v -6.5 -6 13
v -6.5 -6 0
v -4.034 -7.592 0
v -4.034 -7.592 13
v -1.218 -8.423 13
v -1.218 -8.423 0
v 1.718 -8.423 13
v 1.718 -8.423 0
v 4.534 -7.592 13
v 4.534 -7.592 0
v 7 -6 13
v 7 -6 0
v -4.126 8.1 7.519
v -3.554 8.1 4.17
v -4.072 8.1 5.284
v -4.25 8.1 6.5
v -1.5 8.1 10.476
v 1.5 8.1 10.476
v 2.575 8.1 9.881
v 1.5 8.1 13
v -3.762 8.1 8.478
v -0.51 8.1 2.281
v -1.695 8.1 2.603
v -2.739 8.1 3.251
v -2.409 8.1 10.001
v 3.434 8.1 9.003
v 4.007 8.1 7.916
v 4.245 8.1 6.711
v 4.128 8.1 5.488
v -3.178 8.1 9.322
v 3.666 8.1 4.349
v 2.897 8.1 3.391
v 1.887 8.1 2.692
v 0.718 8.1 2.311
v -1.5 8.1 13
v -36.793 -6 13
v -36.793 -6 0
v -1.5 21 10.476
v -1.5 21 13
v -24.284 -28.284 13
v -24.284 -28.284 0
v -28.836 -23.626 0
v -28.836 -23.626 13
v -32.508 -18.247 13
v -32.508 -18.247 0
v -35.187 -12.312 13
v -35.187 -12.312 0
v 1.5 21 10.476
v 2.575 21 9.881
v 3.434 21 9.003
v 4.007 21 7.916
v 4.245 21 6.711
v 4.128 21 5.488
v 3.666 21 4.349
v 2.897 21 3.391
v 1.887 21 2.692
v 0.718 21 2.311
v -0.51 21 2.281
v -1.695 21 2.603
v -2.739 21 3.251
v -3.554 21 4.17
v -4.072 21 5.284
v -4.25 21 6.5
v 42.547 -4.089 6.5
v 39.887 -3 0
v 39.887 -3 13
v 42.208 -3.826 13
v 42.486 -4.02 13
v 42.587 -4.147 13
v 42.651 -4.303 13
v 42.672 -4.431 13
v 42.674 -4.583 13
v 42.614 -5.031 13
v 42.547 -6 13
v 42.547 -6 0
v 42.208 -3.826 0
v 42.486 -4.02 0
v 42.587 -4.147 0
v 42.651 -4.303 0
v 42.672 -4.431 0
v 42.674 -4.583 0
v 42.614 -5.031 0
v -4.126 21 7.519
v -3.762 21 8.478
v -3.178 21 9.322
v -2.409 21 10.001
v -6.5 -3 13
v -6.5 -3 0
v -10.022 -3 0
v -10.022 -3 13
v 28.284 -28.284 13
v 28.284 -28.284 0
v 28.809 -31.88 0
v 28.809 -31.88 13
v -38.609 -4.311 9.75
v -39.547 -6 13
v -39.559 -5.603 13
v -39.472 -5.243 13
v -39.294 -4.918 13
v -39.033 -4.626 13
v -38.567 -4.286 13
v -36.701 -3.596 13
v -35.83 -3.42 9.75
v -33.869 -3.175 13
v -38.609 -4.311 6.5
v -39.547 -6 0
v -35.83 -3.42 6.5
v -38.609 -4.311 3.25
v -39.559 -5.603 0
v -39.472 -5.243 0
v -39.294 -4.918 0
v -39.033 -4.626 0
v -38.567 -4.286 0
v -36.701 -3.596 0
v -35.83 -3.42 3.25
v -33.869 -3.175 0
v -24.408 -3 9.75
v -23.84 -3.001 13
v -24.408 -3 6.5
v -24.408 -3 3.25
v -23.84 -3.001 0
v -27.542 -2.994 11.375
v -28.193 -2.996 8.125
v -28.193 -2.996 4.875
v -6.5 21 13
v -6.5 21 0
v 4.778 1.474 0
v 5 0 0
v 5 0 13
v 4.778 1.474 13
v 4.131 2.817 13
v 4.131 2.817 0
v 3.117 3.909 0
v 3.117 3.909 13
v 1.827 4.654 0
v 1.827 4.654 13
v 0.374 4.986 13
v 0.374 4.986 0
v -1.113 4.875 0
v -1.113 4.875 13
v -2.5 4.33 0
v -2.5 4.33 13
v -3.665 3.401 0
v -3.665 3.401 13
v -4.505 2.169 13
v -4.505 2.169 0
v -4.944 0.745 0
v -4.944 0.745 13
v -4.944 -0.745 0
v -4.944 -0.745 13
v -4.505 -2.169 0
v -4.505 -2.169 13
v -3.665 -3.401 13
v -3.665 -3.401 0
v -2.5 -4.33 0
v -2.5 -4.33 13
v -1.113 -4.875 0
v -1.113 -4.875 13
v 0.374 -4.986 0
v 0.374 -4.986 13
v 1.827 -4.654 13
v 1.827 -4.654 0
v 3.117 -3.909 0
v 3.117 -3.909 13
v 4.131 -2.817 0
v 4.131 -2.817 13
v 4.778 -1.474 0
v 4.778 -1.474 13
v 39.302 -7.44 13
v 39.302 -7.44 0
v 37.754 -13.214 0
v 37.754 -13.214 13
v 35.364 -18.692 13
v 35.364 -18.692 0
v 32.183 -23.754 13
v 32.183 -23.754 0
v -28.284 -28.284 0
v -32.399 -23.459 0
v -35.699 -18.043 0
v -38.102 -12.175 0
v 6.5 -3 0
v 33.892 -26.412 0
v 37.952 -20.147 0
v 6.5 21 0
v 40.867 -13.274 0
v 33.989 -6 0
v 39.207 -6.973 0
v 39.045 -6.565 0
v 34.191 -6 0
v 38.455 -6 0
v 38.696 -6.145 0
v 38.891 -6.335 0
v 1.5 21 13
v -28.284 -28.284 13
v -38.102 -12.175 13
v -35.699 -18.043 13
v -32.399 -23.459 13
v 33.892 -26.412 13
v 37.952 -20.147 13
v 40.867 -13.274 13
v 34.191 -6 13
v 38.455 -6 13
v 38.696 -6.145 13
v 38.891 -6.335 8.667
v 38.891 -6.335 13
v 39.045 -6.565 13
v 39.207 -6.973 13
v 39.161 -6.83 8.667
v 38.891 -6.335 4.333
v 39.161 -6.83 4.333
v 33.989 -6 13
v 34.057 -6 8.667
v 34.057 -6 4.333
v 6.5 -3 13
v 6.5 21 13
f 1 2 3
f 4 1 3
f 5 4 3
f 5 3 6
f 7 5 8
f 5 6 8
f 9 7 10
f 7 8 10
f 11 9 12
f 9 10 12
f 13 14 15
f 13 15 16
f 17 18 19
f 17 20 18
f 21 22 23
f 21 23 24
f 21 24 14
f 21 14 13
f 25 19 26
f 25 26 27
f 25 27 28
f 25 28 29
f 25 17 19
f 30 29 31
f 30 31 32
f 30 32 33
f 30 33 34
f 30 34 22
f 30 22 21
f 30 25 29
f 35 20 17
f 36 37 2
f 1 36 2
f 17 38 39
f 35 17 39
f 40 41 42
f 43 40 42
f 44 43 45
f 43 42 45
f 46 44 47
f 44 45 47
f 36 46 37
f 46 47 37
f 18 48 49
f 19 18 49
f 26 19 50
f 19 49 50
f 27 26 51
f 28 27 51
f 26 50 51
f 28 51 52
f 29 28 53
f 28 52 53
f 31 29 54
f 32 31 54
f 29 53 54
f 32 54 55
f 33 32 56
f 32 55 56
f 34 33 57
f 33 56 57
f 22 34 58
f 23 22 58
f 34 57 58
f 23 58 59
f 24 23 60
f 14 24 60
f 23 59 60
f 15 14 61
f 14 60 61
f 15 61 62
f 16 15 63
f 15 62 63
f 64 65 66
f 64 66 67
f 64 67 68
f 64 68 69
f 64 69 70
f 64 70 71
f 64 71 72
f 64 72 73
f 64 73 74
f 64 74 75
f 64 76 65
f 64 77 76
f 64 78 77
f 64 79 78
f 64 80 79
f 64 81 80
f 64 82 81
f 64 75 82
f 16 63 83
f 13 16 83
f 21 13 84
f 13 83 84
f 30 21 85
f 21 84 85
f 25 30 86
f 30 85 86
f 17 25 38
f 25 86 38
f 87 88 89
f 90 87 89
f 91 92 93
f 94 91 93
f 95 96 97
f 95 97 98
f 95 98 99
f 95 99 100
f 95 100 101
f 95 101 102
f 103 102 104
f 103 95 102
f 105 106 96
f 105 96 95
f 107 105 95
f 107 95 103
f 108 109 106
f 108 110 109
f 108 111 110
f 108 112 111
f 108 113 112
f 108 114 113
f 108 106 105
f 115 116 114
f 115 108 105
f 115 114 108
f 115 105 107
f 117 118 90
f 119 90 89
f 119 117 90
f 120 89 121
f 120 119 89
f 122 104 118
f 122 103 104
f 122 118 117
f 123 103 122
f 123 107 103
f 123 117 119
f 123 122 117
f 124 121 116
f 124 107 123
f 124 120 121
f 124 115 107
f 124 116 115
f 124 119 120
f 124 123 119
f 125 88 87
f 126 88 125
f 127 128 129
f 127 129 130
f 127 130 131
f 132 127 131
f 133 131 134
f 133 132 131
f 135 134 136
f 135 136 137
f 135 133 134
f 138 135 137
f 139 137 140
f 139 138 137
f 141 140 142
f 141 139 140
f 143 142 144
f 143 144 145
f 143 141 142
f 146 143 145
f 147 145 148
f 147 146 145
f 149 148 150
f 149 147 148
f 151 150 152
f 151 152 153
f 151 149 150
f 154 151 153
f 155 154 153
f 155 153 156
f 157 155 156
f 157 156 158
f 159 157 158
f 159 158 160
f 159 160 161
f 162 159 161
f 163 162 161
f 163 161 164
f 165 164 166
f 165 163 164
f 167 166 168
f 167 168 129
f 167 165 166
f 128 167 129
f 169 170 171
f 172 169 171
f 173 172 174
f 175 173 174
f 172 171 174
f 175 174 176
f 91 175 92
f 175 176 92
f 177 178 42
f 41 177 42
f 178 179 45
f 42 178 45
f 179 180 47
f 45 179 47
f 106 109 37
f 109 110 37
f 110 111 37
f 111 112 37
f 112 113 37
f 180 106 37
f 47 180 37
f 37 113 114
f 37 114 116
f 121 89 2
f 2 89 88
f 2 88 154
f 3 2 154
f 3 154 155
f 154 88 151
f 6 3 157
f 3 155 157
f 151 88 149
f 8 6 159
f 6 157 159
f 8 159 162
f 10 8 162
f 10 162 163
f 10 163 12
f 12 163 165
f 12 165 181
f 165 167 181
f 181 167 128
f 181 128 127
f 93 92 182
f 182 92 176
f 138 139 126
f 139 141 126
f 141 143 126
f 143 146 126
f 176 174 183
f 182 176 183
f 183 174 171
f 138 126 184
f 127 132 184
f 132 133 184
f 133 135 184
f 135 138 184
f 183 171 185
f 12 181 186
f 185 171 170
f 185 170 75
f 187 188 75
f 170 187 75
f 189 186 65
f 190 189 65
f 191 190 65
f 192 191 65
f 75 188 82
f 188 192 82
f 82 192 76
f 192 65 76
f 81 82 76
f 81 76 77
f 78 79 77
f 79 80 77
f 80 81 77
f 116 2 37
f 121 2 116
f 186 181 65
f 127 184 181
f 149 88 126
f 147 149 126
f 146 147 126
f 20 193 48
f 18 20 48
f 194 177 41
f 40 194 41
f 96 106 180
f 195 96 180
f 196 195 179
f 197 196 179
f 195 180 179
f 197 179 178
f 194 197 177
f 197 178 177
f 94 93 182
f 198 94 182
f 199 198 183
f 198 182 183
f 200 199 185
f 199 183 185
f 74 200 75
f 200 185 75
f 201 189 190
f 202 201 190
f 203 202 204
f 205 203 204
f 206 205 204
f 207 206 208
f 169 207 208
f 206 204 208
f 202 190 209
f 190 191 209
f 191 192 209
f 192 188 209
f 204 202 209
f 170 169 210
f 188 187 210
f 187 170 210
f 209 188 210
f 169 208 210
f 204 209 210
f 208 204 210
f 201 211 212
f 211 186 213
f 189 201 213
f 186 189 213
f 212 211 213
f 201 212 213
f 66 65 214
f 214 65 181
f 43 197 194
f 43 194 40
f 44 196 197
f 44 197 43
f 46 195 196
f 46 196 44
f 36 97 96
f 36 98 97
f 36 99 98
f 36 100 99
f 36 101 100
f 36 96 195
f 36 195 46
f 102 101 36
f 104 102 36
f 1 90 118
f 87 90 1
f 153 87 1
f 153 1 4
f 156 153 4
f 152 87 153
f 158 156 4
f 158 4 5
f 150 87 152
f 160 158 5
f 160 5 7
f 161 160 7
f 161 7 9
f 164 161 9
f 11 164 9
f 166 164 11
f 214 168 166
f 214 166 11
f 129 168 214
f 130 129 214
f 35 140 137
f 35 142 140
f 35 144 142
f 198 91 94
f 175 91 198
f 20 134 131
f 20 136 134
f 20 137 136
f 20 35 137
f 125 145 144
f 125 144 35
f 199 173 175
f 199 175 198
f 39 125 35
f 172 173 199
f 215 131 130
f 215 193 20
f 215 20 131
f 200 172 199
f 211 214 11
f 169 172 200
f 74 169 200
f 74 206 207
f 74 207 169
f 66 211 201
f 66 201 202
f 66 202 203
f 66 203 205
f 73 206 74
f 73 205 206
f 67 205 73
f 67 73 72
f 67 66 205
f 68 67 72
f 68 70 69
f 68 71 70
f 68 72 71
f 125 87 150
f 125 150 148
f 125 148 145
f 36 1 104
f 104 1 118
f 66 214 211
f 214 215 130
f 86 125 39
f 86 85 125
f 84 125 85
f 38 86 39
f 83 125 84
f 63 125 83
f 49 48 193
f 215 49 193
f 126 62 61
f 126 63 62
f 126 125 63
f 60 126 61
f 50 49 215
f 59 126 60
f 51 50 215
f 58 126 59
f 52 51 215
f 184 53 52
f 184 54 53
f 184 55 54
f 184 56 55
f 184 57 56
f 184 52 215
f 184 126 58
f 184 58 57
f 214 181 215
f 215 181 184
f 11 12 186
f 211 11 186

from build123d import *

# Parameters (mm, degrees)
F0_W     = 13
F0_H     = 24
F2_DEPTH = 13
F1_R     = 5
F3_DEPTH = 13
F5_DEPTH = 12.9


with BuildPart() as f2:
    # F0 (on Top) → F2 (new body)
    with BuildSketch(Plane.XY):
        with BuildLine():
            Line((-6.5, -3), (-10.0215210102, -3))
            add(Edge.make_bspline(
                [(-39.5474398666, -6), (-39.987434644, -3.0998888332), (-28.0679892003, -2.9708801078), (-24.4776253005, -3.0066990198), (-20.0953720274, -2.997292433), (-10.1037282836, -3), (-10.0215210102, -3)],
                knots=[0, 0, 0, 0, 0.3086092965, 0.5067485278, 0.7164039889, 1, 1, 1, 1], degree=3))
            Line((-39.5474398666, -6), (-36.7930133316, -6))
            Line((-36.7930133316, -6), (-6.5, -6))
            Line((-6.5, -6), (-6.5, -3))
        make_face()
        with Locations((0, 9)):
            Rectangle(F0_W, F0_H)
        Polygon((6.5, -3), (-6.5, -3), (-6.5, -6), (7, -6), (7, -3), align=None)
        with BuildLine():
            Line((-36.7930133316, -6), (-39.5474398666, -6))
            ThreePointArc((-39.5474398666, -6), (-35.6991938904, -18.0434906705), (-28.2842712475, -28.2842712475))
            Line((-28.2842712475, -28.2842712475), (-24.2842712475, -28.2842712475))
            ThreePointArc((-24.2842712475, -28.2842712475), (-32.5077815168, -18.2474647794), (-36.7930133316, -6))
        make_face()
        with BuildLine():
            Line((7, -6), (-6.5, -6))
            ThreePointArc((-6.5, -6), (0.25, -8.5279488827), (7, -6))
        make_face()
        with BuildLine():
            Line((39.8873413504, -3), (7, -3))
            Line((7, -3), (7, -6))
            Line((7, -6), (33.9890345931, -6))
            Line((33.9890345931, -6), (34.1910820365, -6))
            add(Edge.make_bspline(
                [(34.1910820365, -6), (36.0233504005, -5.9865327697), (37.61673459, -5.6184481892), (38.4549424052, -6)],
                knots=[0.0219001831, 0.0219001831, 0.0219001831, 0.0219001831, 0.6204731295, 0.6204731295, 0.6204731295, 0.6204731295], degree=3))
            Line((38.4549424052, -6), (39.5474398666, -6))
            ThreePointArc((39.5474398666, -6), (39.4312622039, -6.7212767397), (39.3019308294, -7.4403113564))
            ThreePointArc((39.3019308294, -7.4403113564), (35.3637009344, -18.6924759254), (28.2842712475, -28.2842712475))
            Line((28.2842712475, -28.2842712475), (28.8087523399, -31.880094539))
            ThreePointArc((28.8087523399, -31.880094539), (37.9522247686, -20.1472895028), (42.5474398666, -6))
            add(Edge.make_bspline(
                [(39.8873413504, -3), (40.6612767941, -3.3893066613), (43.3643490326, -3.7338272559), (42.4692446307, -5.1334802328), (42.5474398666, -6)],
                knots=[0, 0, 0, 0, 0.5508525768, 1, 1, 1, 1], degree=3))
        make_face()
        with BuildLine():
            Line((34.1910820365, -6), (33.9890345931, -6))
            add(Edge.make_bspline(
                [(33.9890345931, -6), (34.0566866614, -6.0005107576), (34.124044238, -6.0004927299), (34.1910820365, -6)],
                knots=[0, 0, 0, 0, 0.0219001831, 0.0219001831, 0.0219001831, 0.0219001831], degree=3))
        make_face()
        with BuildLine():
            add(Edge.make_bspline(
                [(34.1910820365, -6), (36.0233504005, -5.9865327697), (37.61673459, -5.6184481892), (38.4549424052, -6)],
                knots=[0.0219001831, 0.0219001831, 0.0219001831, 0.0219001831, 0.6204731295, 0.6204731295, 0.6204731295, 0.6204731295], degree=3))
            Line((34.1910820365, -6), (38.4549424052, -6))
        make_face()
        with BuildLine():
            Line((39.5474398666, -6), (38.4549424052, -6))
            add(Edge.make_bspline(
                [(38.4549424052, -6), (38.9864104423, -6.2419240053), (39.2142802148, -6.7852190746), (39.3019308294, -7.4403113564)],
                knots=[0.6204731295, 0.6204731295, 0.6204731295, 0.6204731295, 1, 1, 1, 1], degree=3))
            ThreePointArc((39.3019308294, -7.4403113564), (39.4312622039, -6.7212767397), (39.5474398666, -6))
        make_face()
    extrude(amount=F2_DEPTH)

    # F1 (on Top) → F3 (cut, through all)
    with BuildSketch(Plane.XY):
        Circle(F1_R)
    extrude(amount=F3_DEPTH, mode=Mode.SUBTRACT)

    # F4 (on face) → F5 (cut)
    with BuildSketch(Plane(origin=(0, 21, 0), x_dir=(-1, 0, 0), z_dir=(0, 1, 0))):
        with BuildLine():
            ThreePointArc((-1.5, 10.4764934301), (-2.4173849507, 3.0044671365), (4.25, 6.5))
            ThreePointArc((4.25, 6.5), (3.4955328635, 8.9173849507), (1.5, 10.4764934301))
            ThreePointArc((1.5, 10.4764934301), (0, 10.75), (-1.5, 10.4764934301))
        make_face()
        with BuildLine():
            ThreePointArc((-1.5, 10.4764934301), (0, 10.75), (1.5, 10.4764934301))
            Line((1.5, 10.4764934301), (1.5, 13))
            Line((1.5, 13), (-1.5, 13))
            Line((-1.5, 13), (-1.5, 10.4764934301))
        make_face()
    extrude(amount=-F5_DEPTH, mode=Mode.SUBTRACT)


solid = f2.part
